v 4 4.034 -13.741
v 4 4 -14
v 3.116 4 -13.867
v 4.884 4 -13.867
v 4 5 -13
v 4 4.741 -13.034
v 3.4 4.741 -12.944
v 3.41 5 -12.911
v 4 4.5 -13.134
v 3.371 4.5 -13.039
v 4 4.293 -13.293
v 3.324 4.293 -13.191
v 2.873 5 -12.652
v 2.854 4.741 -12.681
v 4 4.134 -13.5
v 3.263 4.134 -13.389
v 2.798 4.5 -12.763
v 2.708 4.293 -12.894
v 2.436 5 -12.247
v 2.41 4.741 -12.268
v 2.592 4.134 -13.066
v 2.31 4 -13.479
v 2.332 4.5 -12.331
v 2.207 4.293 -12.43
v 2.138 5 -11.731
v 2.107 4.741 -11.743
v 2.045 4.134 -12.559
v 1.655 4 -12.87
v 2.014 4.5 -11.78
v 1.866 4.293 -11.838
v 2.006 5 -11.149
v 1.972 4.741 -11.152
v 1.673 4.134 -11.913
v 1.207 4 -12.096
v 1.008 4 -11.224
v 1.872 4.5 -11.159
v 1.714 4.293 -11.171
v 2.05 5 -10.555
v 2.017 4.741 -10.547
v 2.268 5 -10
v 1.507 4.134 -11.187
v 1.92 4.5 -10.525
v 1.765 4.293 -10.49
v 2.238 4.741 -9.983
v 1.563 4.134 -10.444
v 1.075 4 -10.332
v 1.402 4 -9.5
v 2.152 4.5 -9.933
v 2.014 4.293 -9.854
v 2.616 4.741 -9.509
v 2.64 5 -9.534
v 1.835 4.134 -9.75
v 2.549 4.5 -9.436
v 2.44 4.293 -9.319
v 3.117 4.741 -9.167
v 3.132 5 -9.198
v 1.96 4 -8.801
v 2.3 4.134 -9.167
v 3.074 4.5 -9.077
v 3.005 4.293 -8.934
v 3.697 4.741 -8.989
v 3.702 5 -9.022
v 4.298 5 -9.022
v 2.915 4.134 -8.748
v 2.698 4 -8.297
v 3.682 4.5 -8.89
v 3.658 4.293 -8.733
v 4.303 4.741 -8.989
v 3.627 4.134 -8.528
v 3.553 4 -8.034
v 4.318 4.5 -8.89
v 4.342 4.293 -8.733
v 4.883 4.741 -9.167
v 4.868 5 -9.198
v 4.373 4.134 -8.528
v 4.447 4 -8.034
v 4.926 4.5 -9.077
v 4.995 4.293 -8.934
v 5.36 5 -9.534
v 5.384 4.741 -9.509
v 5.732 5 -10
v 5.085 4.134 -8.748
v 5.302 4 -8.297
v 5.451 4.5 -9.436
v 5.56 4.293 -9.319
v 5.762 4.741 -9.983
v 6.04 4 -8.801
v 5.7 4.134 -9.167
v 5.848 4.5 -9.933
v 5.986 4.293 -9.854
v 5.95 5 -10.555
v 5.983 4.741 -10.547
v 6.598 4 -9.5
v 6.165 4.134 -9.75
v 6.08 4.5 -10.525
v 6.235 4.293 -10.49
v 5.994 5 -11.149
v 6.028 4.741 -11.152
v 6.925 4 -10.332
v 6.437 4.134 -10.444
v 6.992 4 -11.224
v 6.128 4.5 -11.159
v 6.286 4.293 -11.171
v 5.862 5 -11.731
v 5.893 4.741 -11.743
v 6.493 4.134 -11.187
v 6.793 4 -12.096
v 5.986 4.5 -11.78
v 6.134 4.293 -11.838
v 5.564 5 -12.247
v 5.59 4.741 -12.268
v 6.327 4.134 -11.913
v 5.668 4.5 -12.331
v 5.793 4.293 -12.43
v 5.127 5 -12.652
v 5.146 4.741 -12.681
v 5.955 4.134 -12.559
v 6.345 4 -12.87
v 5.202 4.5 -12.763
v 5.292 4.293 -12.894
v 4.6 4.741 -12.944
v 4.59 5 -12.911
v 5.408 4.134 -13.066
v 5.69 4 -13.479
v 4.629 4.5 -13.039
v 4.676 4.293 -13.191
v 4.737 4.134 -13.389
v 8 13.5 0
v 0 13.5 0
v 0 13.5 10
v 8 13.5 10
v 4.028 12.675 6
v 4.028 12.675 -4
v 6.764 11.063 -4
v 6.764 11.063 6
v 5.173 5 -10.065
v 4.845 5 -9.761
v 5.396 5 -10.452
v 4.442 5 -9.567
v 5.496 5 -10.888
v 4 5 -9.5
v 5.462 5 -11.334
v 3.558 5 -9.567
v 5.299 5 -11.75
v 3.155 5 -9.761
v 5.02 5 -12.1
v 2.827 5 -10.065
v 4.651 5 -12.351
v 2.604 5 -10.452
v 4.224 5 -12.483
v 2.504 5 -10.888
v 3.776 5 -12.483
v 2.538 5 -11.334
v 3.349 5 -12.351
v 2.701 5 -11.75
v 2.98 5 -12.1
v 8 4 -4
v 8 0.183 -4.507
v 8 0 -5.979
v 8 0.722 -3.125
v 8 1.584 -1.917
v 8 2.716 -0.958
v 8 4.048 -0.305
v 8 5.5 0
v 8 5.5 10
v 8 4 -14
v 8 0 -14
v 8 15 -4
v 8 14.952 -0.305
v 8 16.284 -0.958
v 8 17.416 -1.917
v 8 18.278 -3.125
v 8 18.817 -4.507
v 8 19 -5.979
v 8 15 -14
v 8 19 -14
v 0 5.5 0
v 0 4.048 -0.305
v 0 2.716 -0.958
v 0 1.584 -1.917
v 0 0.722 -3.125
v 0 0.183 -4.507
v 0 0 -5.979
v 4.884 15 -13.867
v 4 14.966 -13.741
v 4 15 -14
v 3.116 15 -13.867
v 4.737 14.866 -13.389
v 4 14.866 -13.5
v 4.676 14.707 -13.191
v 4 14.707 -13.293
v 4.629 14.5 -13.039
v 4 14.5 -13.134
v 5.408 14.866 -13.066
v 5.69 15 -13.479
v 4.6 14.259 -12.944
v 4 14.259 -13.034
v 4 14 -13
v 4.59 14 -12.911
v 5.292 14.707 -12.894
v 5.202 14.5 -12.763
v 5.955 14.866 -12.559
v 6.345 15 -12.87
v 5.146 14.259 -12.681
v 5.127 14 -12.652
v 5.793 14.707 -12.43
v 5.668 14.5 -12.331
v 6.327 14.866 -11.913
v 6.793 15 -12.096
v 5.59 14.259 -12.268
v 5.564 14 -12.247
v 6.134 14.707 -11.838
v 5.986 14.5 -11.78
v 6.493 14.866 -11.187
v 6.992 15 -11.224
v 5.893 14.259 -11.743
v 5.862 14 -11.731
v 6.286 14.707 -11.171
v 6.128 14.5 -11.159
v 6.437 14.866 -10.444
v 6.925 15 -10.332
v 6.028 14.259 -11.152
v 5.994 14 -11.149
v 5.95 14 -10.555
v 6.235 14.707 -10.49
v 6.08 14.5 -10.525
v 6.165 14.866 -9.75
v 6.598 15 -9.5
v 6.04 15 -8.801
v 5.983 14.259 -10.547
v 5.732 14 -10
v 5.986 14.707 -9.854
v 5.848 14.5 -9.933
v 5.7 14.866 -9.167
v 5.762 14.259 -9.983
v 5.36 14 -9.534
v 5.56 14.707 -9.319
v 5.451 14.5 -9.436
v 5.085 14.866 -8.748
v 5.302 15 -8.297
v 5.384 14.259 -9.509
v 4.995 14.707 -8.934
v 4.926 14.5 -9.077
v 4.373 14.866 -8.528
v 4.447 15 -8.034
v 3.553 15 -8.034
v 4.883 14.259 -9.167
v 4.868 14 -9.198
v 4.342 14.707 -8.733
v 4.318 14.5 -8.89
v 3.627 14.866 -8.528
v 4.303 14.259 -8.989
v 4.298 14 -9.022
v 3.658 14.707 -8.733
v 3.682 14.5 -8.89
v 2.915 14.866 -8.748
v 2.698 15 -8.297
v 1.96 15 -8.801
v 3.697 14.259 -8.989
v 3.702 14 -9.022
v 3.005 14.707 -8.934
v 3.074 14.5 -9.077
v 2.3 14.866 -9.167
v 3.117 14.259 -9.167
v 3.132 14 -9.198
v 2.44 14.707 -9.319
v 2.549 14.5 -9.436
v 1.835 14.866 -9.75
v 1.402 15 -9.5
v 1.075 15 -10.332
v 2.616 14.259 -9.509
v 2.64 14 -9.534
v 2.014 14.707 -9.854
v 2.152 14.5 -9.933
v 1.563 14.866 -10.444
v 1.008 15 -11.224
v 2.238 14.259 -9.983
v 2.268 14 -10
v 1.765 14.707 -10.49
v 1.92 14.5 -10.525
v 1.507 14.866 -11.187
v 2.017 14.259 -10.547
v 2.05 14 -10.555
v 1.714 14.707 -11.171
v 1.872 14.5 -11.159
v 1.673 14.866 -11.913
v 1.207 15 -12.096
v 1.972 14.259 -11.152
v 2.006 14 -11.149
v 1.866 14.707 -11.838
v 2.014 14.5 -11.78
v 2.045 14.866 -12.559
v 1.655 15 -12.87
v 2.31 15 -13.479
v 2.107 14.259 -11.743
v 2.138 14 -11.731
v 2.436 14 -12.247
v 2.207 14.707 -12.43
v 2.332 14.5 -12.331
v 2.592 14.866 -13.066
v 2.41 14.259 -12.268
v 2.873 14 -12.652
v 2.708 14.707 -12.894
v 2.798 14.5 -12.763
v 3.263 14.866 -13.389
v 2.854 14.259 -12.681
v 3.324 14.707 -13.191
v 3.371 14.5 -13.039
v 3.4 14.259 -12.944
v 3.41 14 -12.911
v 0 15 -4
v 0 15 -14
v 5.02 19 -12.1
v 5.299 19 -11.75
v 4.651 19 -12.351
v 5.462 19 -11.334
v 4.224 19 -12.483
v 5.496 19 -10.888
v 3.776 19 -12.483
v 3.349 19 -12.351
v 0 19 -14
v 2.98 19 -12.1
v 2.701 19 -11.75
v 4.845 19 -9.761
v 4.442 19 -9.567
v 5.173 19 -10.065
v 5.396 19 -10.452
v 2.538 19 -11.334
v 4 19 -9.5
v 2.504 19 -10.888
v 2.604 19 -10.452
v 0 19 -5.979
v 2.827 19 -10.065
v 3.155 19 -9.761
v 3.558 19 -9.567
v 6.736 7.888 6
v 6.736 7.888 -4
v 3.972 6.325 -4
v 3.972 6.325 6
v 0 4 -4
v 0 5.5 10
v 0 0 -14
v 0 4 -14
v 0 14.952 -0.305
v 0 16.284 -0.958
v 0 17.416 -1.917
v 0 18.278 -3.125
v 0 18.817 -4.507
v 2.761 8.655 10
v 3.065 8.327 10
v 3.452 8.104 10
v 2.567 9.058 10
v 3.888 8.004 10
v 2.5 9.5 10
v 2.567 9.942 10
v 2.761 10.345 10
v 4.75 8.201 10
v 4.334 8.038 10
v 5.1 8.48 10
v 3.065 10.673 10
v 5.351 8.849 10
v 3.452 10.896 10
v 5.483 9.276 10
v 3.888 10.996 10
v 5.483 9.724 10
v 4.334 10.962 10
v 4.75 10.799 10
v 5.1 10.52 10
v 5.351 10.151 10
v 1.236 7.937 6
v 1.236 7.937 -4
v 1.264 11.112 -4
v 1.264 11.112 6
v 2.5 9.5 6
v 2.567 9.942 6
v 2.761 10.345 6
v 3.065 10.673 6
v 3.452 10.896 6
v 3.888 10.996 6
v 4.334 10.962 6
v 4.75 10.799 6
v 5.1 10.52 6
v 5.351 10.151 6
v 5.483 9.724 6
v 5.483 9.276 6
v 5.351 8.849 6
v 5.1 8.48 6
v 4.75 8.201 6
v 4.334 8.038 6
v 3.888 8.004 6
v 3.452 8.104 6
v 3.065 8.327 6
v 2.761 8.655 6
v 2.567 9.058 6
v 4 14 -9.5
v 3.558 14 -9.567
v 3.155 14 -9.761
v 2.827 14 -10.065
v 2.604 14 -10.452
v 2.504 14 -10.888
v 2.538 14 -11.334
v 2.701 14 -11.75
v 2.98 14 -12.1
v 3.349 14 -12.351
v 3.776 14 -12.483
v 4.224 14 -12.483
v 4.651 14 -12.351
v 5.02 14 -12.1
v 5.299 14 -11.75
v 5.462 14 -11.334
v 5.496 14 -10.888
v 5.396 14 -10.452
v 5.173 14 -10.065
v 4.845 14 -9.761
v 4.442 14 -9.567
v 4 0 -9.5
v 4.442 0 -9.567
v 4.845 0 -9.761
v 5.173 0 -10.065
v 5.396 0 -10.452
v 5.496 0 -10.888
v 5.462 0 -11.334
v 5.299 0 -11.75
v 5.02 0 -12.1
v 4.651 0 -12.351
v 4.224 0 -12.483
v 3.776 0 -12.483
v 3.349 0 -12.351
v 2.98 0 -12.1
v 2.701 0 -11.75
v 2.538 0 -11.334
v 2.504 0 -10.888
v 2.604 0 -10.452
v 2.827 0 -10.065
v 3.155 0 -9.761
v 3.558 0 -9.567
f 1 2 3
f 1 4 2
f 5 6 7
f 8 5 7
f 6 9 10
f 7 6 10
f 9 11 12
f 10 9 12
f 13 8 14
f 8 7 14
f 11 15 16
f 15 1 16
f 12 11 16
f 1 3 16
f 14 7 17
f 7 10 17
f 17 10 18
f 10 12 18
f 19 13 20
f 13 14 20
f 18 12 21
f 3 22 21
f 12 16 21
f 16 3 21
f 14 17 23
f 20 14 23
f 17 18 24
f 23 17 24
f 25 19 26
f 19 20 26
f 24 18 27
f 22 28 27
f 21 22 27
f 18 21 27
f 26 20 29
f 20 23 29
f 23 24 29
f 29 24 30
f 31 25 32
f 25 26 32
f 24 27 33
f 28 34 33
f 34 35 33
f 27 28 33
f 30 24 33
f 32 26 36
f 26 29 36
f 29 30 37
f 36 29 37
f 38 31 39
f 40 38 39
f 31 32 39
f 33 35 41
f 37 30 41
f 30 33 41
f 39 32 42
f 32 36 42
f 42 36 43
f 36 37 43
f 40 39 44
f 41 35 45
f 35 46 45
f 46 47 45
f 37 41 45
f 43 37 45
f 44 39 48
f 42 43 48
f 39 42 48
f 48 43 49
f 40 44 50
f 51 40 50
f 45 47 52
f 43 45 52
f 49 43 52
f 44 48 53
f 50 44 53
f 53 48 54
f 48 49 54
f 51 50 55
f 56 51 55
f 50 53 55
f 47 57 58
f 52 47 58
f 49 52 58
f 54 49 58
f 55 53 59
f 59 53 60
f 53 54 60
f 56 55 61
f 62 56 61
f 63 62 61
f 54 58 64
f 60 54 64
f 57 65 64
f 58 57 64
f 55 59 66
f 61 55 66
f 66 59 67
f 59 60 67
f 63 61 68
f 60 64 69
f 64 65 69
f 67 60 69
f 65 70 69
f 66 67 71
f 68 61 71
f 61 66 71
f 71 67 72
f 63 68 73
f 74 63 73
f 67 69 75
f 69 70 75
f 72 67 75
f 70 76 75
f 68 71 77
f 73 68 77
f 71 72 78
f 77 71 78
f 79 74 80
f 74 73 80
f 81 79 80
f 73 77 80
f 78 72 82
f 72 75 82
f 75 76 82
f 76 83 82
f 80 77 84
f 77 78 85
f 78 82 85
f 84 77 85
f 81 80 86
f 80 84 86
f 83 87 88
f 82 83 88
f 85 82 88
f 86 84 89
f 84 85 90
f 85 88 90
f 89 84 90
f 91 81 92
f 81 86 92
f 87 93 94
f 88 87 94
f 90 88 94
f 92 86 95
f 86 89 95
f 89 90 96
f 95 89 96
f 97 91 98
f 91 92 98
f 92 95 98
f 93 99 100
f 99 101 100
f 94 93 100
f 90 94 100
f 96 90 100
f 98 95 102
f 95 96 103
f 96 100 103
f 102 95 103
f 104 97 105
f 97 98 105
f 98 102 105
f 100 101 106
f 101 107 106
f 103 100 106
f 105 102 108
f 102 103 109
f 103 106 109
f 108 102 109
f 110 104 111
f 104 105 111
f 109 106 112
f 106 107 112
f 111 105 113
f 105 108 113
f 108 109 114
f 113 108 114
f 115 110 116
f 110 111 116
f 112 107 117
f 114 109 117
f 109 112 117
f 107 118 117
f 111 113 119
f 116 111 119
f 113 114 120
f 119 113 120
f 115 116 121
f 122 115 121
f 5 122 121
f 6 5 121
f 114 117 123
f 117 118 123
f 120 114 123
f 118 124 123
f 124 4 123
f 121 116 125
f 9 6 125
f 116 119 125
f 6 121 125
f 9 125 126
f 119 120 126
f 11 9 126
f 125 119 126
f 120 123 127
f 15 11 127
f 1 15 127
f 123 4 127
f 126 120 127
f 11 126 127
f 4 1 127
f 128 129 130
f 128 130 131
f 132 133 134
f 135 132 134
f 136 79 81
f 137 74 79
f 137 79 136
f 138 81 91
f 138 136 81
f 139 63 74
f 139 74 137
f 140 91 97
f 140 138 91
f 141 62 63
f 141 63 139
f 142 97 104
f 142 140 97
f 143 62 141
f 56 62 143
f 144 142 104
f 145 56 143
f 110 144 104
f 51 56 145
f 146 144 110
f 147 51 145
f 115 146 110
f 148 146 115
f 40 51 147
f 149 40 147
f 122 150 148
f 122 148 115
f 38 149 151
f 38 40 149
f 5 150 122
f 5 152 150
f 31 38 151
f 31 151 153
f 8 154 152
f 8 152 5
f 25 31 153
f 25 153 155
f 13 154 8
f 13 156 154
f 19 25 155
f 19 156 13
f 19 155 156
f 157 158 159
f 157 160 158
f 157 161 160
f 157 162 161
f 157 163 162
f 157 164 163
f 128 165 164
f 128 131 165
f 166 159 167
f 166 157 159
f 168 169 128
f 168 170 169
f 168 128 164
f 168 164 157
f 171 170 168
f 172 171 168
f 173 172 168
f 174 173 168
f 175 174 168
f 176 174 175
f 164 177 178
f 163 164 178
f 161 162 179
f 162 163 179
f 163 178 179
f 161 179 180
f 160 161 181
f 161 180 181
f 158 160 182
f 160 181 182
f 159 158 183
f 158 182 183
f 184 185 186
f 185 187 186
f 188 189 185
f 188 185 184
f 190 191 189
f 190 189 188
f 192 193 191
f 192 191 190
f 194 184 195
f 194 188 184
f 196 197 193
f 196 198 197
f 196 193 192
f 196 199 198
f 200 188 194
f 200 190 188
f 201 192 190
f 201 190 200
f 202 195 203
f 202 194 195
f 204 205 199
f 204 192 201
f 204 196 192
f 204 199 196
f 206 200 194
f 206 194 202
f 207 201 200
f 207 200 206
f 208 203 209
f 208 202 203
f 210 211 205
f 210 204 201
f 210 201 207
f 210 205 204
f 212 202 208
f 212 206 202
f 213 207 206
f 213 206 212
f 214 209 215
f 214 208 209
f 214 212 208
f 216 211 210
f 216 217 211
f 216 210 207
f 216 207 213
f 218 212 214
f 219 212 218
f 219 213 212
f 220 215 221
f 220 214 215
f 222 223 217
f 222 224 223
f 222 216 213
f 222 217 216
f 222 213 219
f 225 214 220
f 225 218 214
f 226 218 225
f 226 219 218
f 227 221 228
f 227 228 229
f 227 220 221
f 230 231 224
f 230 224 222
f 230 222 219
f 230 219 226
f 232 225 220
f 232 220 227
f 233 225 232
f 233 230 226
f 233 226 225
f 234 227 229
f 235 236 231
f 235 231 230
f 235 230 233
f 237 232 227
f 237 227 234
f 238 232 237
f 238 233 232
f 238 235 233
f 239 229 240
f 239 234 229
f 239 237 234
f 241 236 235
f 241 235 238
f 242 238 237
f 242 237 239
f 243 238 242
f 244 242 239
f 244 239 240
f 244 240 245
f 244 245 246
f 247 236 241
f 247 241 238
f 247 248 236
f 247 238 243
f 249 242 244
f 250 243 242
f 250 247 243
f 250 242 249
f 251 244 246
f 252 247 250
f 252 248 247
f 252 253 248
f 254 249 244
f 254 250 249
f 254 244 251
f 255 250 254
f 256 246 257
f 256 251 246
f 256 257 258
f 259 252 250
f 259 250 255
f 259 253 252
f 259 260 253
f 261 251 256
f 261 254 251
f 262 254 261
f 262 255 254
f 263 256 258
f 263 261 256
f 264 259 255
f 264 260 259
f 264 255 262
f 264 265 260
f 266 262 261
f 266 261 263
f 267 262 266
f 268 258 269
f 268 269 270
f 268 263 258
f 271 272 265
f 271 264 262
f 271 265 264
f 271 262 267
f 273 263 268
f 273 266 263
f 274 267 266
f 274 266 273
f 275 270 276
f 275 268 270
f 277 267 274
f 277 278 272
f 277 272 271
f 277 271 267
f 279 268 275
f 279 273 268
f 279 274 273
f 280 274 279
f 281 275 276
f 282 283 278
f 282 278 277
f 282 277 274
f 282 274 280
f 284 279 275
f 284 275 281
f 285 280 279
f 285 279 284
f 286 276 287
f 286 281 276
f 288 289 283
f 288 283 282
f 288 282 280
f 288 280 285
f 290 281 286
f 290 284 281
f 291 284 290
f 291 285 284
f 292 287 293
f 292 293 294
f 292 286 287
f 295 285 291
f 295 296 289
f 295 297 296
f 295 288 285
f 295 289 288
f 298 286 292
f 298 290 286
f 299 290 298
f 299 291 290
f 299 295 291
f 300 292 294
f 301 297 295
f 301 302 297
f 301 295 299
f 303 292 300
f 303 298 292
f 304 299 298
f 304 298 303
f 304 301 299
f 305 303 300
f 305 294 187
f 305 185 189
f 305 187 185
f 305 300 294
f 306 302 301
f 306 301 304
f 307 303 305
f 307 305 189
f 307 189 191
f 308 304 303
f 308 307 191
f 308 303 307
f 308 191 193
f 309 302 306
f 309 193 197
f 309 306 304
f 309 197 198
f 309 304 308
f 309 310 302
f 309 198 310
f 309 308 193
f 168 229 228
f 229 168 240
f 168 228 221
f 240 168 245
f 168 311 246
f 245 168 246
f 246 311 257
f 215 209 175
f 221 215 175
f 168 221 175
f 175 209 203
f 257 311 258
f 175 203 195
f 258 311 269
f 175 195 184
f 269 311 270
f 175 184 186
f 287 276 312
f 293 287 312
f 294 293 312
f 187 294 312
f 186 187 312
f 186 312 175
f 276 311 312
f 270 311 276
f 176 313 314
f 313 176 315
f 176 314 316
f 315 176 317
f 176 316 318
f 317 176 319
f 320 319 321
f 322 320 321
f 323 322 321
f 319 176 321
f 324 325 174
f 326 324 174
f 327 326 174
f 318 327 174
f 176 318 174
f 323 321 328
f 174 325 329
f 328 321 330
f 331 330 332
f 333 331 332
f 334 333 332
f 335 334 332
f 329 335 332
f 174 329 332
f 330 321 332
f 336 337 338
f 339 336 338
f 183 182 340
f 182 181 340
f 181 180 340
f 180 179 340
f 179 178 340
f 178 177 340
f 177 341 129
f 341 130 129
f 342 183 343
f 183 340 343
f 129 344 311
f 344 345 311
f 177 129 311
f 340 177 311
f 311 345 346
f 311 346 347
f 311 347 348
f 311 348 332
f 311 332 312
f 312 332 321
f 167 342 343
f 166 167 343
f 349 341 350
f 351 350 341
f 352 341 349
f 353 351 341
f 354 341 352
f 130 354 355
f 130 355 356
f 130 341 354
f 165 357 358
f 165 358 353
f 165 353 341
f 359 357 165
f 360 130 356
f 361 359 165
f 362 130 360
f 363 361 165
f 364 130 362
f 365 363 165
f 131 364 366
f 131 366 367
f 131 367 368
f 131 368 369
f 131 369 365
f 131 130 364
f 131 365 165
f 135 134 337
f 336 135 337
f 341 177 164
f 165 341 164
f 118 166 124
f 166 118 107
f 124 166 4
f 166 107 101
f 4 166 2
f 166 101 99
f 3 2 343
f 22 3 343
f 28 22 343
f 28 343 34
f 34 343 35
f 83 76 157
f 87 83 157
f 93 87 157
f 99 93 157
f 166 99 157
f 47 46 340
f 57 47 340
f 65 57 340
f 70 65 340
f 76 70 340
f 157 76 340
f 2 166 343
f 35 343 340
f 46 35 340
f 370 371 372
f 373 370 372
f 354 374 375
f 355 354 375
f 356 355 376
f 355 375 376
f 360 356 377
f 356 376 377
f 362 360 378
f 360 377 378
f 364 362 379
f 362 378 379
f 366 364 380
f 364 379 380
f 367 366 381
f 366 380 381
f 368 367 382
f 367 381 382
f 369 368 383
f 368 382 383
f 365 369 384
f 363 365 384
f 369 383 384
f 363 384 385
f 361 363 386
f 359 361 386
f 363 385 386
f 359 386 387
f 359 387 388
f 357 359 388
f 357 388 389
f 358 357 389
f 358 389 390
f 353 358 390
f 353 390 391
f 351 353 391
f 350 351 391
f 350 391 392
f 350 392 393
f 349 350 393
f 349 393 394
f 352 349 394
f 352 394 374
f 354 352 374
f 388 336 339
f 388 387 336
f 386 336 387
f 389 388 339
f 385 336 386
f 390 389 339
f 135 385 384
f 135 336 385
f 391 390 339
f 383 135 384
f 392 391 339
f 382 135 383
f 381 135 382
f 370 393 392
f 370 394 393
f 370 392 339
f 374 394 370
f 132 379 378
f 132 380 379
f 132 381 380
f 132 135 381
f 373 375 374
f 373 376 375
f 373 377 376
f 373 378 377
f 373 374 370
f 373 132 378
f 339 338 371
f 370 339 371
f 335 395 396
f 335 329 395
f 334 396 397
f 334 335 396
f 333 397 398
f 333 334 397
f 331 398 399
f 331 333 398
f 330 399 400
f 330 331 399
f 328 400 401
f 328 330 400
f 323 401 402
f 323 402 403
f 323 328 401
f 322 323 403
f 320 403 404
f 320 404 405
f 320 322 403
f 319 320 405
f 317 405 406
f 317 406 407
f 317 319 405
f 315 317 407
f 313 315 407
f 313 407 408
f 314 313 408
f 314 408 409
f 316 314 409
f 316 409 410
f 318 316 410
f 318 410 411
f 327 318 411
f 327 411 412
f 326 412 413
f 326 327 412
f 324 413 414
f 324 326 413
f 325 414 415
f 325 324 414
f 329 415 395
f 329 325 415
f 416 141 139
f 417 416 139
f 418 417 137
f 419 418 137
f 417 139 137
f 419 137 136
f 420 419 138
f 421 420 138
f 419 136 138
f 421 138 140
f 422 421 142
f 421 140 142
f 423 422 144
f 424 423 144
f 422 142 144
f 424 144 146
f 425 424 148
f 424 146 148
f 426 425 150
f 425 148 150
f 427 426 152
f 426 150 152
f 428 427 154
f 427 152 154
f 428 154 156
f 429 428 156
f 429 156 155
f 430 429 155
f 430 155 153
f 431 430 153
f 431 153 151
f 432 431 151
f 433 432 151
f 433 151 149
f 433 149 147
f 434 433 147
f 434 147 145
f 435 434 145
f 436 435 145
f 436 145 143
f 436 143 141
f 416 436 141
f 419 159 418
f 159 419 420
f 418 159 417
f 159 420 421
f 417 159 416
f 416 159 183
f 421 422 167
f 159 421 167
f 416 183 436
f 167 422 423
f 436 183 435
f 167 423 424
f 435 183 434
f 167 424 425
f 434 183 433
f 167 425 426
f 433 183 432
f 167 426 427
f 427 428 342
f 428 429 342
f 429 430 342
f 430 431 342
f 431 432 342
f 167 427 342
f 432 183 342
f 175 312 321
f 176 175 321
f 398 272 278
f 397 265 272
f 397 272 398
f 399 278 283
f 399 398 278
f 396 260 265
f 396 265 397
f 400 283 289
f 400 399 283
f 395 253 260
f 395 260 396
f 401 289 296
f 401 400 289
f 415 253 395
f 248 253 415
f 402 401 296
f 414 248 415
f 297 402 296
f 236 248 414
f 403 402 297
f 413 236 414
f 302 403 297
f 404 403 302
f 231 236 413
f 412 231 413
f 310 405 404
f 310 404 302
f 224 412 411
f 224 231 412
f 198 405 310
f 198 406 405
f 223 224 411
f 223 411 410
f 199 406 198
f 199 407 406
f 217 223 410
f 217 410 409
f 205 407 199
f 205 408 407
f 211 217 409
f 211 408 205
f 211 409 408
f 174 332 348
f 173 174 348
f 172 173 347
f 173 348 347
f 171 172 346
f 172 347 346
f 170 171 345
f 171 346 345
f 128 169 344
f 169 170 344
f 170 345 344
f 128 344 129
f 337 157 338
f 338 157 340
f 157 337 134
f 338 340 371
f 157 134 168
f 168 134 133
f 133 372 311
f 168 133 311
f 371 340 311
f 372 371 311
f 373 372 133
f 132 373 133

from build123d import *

# Parameters (mm, degrees)
EXTRUDE_1_DEPTH     = 8
CUT_EXTRUDE_1_REACH = 26.92
SKETCH_4_R          = 1.5
EXTRUDE_START       = 1
SKETCH_5_R          = 2
SKETCH_5_R_2        = 1.5
EXTRUDE_2_DEPTH     = 1
SKETCH_6_R          = 2
SKETCH_6_R_2        = 1.5
EXTRUDE_3_DEPTH     = 1
FILLET_1_R          = 1
FILLET_2_R          = 1
SKETCH_10_W         = 8
SKETCH_10_H         = 8
EXTRUDE_5_DEPTH     = 10
SKETCH_7_R          = 1.5
CUT_EXTRUDE_2_DEPTH = 14
CUT_EXTRUDE_3_DEPTH = 10
FILLET_3_R          = 6
FILLET_4_R          = 6


# Some blends are built 0.0001 mm under size
with BuildPart() as part:
    # Эскиз3 → Бобышка-Вытянуть1 (new body)
    with BuildSketch(Plane(origin=(0, 0, 0), x_dir=(0, 0, -1), z_dir=(1, 0, 0))):
        Polygon((0, 0), (14, 0), (14, 4), (4, 4), (4, 15), (14, 15), (14, 19), (0, 19), align=None)
    extrude(amount=EXTRUDE_1_DEPTH)

    # Вырез-Вытянуть1: up to this face of the body (flat: up to its plane)
    cut_extrude_1_end = Plane(part.part.faces().sort_by_distance((4, 0, -7))[0])
    # Эскиз4 → Вырез-Вытянуть1 (cut, up to the picked face)
    with BuildSketch(Plane(origin=(0, 19, 0), x_dir=(1, 0, 0), z_dir=(0, 1, 0)), mode=Mode.PRIVATE) as cut_extrude_1_sk1:
        with Locations(Location((4, 11, 0), (0, 0, 270))):
            Circle(SKETCH_4_R)
    cut_extrude_1_tool1 = split(extrude(cut_extrude_1_sk1.sketch, amount=-CUT_EXTRUDE_1_REACH, mode=Mode.PRIVATE), bisect_by=cut_extrude_1_end, keep=Keep.BOTH, mode=Mode.PRIVATE)
    add(cut_extrude_1_tool1.solids().sort_by(Axis((4, 19, -11), (0, -1, 0)))[0], mode=Mode.SUBTRACT)

    # Эскиз5 → Бобышка-Вытянуть2 (add)
    with BuildSketch(Plane(origin=(0, 4, 0), x_dir=(1, 0, 0), z_dir=(0, 1, 0)).offset(EXTRUDE_START)):
        with Locations(Location((4, 11, 0), (0, 0, 90))):
            Circle(SKETCH_5_R)
        with Locations(Location((4, 11, 0), (0, 0, 270))):
            Circle(SKETCH_5_R_2, mode=Mode.SUBTRACT)
    extrude(amount=-EXTRUDE_2_DEPTH)

    # Эскиз6 → Бобышка-Вытянуть3 (add)
    with BuildSketch(Plane(origin=(0, 15, 0), x_dir=(-1, 0, 0), z_dir=(0, -1, 0))):
        with Locations(Location((-4, 11, 0), (0, 0, 90))):
            Circle(SKETCH_6_R)
        with Locations(Location((-4, 11, 0), (0, 0, 270))):
            Circle(SKETCH_6_R_2, mode=Mode.SUBTRACT)
    extrude(amount=EXTRUDE_3_DEPTH)

    # Скругление1
    fillet_1_edges = [part.edges().sort_by_distance(p)[0] for p in [
        (4, 4, -9),
    ]]
    fillet(fillet_1_edges, radius=FILLET_1_R - 0.0001)  # a hair under: the kernel refuses the full size

    # Скругление2
    fillet_2_edges = [part.edges().sort_by_distance(p)[0] for p in [
        (4, 15, -9),
    ]]
    fillet(fillet_2_edges, radius=FILLET_2_R - 0.0001)  # a hair under: the kernel refuses the full size

    # Эскиз10 → Бобышка-Вытянуть5 (add)
    with BuildSketch(Plane.XY):
        with Locations((4, 9.5)):
            Rectangle(SKETCH_10_W, SKETCH_10_H)
    extrude(amount=EXTRUDE_5_DEPTH)

    # Эскиз7 → Вырез-Вытянуть2 (cut)
    with BuildSketch(Plane(origin=(0, 0, -4), x_dir=(-1, 0, 0), z_dir=(0, 0, -1))):
        with Locations((-4, 9.5)):
            Circle(SKETCH_7_R)
    extrude(amount=-CUT_EXTRUDE_2_DEPTH, mode=Mode.SUBTRACT)

    # Эскиз9 → Вырез-Вытянуть3 (cut)
    with BuildSketch(Plane(origin=(0, 0, -4), x_dir=(-1, 0, 0), z_dir=(0, 0, -1))):
        Polygon((-1.264118223, 11.111919426), (-4.028022284, 12.675302834), (-6.763904061, 11.063383407), (-6.735881777, 7.888080574), (-3.971977716, 6.324697166), (-1.236095939, 7.936616593), align=None)
    extrude(amount=-CUT_EXTRUDE_3_DEPTH, mode=Mode.SUBTRACT)

    # Скругление3
    # the kernel refuses this fillet: 6 mm, written as the material it takes off along each edge
    with BuildSketch(Plane(origin=(-14.947825929, 19, 0), x_dir=(0, 0, -1), z_dir=(1, 0, 0))) as fillet_3_piece_1:
        with BuildLine():
            CenterArc((5.979130372, -6), FILLET_3_R, 90, 85.219808153)
            Line((0, -5.5), (-0.119582607, -5.49))
            ThreePointArc((-0.119582607, -5.49), (-0.12, -2.75), (-0.12, 0))
            Line((-0.12, 0), (0, 0.12))
            Line((0, 0.12), (5.979130372, 0.12))
            Line((5.979130372, 0.12), (5.979130372, 0))
        make_face()
    extrude(amount=37.895651858, mode=Mode.SUBTRACT)

    # Скругление4
    # the kernel refuses this fillet: 6 mm, written as the material it takes off along each edge
    with BuildSketch(Plane(origin=(-14.947825929, 0, 0), x_dir=(0, 1, 0), z_dir=(1, 0, 0))) as fillet_4_piece_1:
        with BuildLine():
            CenterArc((6, -5.979130372), FILLET_4_R, 94.780191847, 85.219808153)
            Line((0, -5.979130372), (-0.12, -5.979130372))
            Line((-0.12, -5.979130372), (-0.12, 0))
            Line((-0.12, 0), (0, 0.12))
            ThreePointArc((0, 0.12), (2.75, 0.12), (5.49, 0.119582607))
            Line((5.49, 0.119582607), (5.5, 0))
        make_face()
    extrude(amount=37.895651858, mode=Mode.SUBTRACT)


solid = part.part
